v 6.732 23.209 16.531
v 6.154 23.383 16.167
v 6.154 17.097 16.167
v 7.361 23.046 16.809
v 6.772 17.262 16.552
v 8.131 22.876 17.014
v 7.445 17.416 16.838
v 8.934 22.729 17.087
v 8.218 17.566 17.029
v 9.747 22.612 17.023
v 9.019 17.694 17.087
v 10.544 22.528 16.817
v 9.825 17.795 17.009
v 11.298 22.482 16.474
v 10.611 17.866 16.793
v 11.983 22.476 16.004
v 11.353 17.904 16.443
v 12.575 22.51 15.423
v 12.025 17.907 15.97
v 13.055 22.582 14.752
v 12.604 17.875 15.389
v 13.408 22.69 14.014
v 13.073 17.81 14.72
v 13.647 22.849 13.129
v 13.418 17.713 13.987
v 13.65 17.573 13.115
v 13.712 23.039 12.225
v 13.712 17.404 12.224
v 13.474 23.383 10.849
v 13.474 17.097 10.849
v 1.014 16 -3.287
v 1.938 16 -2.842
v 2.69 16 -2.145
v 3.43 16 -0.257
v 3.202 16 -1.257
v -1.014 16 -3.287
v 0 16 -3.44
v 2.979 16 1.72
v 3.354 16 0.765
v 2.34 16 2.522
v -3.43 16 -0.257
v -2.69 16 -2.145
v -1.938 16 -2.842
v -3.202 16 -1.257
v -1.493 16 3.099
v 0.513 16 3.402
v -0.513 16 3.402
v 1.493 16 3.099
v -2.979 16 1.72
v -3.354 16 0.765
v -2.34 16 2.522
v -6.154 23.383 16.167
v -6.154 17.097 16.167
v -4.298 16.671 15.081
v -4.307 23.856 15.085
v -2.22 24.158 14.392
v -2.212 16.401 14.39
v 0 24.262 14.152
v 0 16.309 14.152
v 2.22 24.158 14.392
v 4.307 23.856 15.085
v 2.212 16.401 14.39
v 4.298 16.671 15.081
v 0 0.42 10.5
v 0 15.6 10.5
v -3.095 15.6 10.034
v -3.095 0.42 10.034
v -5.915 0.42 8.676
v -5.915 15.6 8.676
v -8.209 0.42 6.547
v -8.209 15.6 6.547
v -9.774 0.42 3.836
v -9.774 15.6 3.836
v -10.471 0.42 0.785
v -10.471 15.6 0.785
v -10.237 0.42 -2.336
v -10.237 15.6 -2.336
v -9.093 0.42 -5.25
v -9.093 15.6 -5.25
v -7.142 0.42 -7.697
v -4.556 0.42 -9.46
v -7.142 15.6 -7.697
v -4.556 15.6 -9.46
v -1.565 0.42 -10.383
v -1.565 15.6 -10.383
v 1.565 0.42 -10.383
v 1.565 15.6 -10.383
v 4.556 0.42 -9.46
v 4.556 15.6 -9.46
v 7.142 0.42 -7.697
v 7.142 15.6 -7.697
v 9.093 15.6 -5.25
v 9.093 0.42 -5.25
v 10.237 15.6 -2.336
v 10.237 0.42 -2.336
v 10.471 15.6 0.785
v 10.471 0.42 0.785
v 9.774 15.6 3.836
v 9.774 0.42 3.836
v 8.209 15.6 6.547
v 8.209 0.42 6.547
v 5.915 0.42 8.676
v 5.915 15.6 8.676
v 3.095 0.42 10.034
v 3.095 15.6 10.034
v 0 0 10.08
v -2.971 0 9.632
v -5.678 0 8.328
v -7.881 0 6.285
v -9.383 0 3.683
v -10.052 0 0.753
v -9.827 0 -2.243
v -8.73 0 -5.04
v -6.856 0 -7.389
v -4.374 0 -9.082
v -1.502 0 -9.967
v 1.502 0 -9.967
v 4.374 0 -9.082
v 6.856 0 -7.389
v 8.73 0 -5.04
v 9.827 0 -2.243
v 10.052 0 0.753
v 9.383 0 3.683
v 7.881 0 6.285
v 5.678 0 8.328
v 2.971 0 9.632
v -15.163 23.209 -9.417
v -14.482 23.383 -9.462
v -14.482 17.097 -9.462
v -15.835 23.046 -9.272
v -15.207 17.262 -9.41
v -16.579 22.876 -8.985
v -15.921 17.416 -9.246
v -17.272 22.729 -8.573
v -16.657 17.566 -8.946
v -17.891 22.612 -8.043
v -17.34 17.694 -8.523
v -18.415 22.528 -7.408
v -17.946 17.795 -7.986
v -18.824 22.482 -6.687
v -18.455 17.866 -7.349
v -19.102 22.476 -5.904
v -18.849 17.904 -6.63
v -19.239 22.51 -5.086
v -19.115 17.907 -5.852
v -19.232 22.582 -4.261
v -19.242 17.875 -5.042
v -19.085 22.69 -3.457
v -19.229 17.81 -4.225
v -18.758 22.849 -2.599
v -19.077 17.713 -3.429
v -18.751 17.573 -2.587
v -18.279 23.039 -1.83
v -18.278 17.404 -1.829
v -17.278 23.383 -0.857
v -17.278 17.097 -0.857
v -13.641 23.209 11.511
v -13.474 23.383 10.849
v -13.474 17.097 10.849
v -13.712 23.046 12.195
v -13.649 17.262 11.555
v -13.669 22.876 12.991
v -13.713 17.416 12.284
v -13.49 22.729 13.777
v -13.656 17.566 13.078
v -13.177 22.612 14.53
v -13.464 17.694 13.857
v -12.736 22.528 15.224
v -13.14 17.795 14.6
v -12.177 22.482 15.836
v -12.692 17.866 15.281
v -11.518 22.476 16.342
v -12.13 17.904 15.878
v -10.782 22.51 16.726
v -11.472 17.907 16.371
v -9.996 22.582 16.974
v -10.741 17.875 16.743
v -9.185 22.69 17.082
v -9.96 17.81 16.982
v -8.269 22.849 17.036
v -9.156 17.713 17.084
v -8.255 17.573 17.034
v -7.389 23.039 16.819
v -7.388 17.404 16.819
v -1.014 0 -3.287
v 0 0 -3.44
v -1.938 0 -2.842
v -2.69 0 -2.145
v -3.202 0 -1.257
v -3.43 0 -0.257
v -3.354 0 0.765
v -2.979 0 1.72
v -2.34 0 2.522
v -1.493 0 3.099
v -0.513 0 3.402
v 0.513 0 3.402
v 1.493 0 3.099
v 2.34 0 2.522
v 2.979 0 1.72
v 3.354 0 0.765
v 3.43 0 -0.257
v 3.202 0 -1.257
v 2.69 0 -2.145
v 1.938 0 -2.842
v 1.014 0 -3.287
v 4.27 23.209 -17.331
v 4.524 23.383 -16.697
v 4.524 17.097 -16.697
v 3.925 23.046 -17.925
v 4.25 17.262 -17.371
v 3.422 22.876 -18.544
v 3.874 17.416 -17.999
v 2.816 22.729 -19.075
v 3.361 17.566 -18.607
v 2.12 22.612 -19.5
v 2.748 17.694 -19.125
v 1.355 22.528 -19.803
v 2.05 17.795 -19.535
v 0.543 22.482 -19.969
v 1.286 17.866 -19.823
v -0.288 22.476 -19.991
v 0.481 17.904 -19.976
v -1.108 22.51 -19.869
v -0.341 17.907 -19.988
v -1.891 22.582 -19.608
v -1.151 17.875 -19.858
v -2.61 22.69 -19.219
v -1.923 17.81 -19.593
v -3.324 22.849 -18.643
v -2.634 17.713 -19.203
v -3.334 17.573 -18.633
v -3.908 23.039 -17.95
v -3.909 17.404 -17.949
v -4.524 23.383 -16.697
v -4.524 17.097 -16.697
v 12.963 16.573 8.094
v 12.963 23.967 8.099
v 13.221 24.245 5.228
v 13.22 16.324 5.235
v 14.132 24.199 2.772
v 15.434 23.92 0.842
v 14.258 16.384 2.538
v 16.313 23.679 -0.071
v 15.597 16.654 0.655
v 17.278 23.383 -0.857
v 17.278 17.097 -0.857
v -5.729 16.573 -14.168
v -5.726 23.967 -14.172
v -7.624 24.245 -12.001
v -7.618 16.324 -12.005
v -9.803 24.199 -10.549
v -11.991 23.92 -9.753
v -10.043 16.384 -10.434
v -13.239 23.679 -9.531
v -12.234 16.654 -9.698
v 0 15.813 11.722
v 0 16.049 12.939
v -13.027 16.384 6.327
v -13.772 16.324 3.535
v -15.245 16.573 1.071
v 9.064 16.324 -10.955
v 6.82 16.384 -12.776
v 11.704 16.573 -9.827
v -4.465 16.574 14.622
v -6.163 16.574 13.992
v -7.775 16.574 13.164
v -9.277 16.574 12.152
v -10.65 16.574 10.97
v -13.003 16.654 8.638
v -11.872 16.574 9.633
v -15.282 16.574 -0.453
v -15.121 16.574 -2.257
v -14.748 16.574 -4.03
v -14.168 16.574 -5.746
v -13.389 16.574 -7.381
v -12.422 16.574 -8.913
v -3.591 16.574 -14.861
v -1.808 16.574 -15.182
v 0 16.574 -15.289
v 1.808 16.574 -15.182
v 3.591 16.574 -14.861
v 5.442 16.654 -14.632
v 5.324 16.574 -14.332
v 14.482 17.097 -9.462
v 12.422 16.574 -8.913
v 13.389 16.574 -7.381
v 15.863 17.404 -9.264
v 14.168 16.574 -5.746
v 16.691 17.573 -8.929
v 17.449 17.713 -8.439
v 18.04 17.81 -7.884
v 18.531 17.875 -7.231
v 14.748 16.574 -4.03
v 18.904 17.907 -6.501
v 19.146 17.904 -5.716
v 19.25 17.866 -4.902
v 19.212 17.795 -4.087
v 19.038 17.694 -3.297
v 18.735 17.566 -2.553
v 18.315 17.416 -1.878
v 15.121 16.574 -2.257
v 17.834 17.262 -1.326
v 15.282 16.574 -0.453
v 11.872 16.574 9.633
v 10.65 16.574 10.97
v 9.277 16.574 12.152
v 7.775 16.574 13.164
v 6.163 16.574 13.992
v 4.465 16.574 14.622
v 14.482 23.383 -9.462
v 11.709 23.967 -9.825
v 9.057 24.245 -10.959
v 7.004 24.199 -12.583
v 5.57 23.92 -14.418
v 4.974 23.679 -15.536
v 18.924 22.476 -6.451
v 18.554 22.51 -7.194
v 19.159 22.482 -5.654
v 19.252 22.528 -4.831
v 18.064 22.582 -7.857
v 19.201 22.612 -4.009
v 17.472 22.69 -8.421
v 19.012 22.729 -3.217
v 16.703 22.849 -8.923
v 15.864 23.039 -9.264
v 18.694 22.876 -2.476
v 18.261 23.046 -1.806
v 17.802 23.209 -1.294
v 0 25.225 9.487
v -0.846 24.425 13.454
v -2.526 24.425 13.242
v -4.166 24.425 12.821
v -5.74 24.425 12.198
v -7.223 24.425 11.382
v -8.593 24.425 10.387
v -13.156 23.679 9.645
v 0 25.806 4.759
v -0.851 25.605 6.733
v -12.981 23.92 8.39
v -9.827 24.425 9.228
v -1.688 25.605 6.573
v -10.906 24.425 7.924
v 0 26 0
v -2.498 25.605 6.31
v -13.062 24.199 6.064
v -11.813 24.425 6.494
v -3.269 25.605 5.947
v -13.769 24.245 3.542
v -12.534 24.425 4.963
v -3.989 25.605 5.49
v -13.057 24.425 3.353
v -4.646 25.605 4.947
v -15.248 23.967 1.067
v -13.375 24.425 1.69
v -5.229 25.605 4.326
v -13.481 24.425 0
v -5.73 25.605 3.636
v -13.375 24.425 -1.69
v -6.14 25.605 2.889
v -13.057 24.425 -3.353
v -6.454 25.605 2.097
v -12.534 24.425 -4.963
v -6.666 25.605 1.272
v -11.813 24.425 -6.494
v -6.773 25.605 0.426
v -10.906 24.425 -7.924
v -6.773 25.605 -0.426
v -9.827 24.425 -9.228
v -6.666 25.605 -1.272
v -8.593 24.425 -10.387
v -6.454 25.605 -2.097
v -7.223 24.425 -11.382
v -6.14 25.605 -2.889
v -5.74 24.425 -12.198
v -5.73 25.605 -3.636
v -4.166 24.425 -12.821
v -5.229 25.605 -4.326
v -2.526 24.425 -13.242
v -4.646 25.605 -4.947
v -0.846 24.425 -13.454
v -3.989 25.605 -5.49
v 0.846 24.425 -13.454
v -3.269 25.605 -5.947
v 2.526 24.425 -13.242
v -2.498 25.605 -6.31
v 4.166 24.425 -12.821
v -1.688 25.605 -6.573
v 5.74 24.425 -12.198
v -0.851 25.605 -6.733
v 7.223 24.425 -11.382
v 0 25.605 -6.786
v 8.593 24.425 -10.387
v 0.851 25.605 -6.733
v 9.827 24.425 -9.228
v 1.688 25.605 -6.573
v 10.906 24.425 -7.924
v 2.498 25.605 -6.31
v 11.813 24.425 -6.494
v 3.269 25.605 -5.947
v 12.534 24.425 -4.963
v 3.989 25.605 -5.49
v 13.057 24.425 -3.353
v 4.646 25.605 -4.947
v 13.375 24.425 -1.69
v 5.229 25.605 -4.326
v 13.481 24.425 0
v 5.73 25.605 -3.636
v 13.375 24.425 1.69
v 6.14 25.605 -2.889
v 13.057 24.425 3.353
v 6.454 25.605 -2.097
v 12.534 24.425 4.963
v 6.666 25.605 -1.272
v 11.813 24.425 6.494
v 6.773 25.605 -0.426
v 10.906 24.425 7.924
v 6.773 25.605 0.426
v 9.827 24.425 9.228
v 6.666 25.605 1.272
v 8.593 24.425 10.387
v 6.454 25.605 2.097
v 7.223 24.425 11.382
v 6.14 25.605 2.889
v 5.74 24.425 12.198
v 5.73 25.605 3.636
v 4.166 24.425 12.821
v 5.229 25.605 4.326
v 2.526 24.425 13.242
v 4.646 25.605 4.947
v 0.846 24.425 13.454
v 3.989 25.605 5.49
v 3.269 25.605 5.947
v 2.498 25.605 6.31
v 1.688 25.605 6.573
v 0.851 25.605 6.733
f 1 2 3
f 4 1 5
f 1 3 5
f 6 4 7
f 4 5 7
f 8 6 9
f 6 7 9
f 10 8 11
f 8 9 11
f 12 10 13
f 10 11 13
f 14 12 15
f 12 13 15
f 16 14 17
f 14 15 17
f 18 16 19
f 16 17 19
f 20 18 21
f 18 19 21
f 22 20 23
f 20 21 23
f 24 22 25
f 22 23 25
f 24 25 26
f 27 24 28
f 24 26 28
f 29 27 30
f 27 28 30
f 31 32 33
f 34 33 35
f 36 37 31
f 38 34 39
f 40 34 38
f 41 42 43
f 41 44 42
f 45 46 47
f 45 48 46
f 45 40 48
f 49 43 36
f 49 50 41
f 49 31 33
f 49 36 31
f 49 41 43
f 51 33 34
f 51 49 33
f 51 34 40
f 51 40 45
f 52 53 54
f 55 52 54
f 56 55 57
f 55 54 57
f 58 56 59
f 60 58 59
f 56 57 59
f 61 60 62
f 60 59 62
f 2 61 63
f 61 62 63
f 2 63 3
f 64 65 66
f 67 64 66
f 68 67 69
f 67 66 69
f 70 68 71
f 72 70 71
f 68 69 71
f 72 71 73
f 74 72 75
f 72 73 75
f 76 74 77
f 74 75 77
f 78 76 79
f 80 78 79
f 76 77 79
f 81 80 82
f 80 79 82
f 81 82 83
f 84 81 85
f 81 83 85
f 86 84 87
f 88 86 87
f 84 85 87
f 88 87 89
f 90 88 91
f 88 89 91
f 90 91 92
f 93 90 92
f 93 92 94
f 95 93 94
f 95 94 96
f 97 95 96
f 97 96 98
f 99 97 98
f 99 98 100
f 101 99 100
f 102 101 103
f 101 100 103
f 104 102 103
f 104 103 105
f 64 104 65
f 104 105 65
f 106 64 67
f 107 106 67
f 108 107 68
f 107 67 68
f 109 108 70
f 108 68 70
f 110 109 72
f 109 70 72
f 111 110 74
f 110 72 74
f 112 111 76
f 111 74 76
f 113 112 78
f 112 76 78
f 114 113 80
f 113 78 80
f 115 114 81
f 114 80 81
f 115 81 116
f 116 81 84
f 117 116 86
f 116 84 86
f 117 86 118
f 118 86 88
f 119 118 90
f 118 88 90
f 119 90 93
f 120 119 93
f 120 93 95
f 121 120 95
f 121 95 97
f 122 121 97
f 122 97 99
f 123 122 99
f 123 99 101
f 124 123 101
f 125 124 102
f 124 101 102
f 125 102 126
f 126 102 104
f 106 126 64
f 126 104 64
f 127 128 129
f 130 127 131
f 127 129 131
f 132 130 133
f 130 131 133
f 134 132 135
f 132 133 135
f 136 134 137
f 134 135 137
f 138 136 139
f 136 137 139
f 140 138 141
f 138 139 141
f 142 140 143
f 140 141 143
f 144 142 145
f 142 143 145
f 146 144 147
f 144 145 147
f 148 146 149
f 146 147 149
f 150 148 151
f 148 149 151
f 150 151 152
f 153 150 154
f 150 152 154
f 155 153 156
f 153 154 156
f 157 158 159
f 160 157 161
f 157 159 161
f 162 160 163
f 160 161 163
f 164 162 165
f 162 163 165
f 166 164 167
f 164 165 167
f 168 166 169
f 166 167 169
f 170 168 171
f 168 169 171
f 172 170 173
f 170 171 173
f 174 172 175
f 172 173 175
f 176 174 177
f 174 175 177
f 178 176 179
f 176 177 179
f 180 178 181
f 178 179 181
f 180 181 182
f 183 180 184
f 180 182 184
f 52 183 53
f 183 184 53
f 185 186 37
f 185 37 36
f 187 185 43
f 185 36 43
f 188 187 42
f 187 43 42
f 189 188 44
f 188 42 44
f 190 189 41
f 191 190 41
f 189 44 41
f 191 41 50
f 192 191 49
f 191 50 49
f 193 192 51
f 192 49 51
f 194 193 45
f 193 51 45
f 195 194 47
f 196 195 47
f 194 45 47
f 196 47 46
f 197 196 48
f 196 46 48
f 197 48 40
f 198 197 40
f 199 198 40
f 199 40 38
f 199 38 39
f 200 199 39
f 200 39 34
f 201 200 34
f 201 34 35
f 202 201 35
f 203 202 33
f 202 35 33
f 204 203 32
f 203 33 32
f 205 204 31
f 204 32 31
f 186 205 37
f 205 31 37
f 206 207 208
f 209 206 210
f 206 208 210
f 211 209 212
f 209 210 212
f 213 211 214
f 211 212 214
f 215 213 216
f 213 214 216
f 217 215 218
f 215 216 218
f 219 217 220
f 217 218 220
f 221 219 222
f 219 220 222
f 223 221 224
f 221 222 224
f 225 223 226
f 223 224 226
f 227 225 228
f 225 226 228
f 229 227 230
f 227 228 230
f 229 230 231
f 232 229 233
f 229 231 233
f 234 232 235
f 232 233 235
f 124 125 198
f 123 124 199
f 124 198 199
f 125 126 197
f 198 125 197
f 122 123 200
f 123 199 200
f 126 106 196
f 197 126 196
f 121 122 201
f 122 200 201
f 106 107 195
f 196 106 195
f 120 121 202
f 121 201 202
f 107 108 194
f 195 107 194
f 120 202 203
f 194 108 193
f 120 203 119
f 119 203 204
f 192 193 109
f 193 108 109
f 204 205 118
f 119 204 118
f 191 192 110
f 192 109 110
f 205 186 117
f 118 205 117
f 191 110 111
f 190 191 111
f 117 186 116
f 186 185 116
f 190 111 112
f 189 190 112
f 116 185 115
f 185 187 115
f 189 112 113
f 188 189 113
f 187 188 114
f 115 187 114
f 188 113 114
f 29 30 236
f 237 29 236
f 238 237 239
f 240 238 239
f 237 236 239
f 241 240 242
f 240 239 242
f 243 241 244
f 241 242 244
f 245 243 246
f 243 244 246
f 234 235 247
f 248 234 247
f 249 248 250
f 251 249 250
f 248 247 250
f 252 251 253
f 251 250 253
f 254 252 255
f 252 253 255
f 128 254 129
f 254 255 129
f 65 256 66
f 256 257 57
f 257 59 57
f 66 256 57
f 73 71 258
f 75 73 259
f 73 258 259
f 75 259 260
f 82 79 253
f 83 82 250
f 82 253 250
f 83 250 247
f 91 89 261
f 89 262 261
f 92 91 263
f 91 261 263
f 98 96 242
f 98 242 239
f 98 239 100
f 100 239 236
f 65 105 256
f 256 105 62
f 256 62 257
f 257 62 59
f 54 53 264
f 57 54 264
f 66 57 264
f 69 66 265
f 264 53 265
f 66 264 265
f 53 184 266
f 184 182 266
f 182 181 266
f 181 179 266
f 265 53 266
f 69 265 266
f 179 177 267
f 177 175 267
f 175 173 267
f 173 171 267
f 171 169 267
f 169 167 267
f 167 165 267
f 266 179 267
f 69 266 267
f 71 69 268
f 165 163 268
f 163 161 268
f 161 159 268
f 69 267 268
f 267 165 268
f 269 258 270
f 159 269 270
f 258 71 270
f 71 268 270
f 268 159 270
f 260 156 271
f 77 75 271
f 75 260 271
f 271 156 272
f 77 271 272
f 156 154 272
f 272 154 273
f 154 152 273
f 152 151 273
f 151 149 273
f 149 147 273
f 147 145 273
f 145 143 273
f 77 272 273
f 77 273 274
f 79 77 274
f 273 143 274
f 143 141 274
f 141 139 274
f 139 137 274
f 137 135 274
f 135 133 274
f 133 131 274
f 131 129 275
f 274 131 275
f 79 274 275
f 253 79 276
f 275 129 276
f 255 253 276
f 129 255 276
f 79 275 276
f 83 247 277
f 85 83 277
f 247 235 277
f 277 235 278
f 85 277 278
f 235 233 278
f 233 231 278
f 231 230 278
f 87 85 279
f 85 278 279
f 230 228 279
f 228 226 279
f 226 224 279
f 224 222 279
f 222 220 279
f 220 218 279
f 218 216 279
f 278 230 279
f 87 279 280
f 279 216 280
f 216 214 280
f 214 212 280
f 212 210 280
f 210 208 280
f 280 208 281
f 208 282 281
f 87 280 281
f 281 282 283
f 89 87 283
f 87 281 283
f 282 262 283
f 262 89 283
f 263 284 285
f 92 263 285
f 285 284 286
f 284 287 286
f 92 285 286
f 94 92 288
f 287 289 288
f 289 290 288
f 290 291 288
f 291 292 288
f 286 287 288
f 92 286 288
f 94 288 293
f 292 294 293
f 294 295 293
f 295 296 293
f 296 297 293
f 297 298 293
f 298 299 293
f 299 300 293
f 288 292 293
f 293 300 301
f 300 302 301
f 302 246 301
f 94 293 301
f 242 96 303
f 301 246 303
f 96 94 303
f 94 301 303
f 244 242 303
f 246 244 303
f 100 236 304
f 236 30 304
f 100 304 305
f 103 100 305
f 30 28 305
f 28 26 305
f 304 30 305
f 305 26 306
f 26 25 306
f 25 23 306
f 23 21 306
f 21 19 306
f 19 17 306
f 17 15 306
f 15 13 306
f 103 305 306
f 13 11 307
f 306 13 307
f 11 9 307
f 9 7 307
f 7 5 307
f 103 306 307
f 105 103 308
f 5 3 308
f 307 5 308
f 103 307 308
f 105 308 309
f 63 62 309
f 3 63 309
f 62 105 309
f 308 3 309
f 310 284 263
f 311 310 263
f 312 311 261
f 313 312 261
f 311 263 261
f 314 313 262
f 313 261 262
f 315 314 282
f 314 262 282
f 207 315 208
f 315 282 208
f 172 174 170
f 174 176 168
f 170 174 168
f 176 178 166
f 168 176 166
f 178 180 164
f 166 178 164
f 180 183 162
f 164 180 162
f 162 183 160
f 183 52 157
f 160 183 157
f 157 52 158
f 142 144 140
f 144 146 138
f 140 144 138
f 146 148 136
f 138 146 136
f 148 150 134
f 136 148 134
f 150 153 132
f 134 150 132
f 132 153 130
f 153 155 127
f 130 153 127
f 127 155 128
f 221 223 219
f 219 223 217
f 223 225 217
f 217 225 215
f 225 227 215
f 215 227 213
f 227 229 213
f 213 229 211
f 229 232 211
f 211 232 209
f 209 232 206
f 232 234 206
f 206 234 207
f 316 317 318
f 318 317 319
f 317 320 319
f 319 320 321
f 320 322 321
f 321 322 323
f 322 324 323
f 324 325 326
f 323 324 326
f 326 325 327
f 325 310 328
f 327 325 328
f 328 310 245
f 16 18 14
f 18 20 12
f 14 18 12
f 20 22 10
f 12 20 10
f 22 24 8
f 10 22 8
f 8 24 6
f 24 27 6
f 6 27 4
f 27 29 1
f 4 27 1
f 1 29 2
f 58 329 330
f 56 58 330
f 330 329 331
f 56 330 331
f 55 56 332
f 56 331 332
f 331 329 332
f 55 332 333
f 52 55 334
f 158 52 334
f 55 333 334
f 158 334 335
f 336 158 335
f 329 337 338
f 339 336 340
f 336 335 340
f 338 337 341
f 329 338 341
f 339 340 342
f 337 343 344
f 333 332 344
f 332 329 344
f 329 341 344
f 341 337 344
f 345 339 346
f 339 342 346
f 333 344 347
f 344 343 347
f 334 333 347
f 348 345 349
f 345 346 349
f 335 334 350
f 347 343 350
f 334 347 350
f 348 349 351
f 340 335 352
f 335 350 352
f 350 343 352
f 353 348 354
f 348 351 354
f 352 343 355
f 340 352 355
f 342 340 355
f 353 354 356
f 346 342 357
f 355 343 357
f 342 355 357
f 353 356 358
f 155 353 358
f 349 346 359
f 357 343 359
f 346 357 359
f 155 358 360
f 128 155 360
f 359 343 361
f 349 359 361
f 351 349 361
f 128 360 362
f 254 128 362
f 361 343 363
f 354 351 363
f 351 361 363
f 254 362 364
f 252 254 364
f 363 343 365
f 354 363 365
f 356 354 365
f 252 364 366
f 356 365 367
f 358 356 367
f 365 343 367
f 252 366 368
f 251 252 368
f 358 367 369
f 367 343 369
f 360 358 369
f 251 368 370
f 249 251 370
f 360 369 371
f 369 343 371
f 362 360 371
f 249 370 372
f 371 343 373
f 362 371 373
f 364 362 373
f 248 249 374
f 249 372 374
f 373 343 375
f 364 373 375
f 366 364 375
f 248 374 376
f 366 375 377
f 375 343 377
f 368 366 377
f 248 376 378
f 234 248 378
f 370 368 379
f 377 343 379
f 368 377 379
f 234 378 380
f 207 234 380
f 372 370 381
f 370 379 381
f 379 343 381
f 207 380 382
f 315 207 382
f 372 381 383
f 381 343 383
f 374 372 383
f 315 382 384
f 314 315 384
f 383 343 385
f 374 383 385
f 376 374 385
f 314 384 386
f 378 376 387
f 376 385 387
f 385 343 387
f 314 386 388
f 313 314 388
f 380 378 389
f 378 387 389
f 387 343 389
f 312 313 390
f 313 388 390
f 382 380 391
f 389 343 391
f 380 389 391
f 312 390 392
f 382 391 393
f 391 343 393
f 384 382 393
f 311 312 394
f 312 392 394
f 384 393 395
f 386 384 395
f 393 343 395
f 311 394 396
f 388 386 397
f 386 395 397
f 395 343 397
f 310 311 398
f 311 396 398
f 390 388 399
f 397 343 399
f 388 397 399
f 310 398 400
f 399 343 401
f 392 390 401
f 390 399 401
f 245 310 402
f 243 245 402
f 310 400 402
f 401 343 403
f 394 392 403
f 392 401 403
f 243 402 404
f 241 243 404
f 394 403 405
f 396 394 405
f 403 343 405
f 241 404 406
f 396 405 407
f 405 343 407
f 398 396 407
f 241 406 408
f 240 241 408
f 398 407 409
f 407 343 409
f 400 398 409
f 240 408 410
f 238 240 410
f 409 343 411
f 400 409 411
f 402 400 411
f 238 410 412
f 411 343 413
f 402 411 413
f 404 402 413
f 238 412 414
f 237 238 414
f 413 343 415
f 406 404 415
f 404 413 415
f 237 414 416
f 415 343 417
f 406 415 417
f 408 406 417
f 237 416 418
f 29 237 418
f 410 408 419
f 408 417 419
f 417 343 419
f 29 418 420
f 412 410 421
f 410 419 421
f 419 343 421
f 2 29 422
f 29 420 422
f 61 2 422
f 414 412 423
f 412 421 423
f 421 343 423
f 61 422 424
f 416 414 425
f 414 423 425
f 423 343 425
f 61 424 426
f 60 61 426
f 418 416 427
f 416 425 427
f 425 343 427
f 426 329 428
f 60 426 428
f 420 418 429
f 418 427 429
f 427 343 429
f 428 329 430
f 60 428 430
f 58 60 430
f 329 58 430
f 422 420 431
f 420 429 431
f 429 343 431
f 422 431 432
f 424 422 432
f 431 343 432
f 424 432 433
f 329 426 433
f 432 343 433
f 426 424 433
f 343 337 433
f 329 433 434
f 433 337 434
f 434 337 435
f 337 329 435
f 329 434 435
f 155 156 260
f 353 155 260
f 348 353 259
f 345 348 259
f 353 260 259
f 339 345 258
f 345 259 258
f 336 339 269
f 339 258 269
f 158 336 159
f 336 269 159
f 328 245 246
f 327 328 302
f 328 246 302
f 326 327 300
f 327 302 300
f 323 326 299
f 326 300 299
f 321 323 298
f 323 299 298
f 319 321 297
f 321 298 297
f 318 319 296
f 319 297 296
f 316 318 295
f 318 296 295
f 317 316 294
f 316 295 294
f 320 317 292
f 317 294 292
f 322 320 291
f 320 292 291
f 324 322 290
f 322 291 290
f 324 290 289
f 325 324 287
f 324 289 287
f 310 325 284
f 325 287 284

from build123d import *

# Parameters (mm, degrees)
SKETCH_2_R          = 21
CUT_EXTRUDE_1_DEPTH = 39.418745425
SKETCH_3_W          = 3.44
SKETCH_3_H          = 16
CHAMFER_1_SIZE      = 0.42


with BuildPart() as part:
    # 草图1 → 旋转1 (revolve)
    with BuildSketch(Plane.XY, mode=Mode.PRIVATE) as revolve_1_sk:
        with BuildLine():
            Line((0, 0), (-10.5, 0))
            Line((-10.5, 0), (-10.5, 15.6))
            ThreePointArc((-10.5, 15.6), (-15.293686607, 16.575499043), (-20, 17.910281389))
            Line((-20, 17.910281389), (-20, 22.473460386))
            ThreePointArc((-20, 22.473460386), (-10.154266119, 25.111616828), (0, 26))
            Line((0, 26), (0, 0))
        make_face()
    revolve(revolve_1_sk.sketch.rotate(Axis((0, 26, 0), (0, -1, 0)), 270), axis=Axis((0, 26, 0), (0, -1, 0)))

    # 草图2 → 切除-拉伸1 (cut, through all)
    with BuildSketch(Plane(origin=(0, 0, 0), x_dir=(1, 0, 0), z_dir=(0, 1, 0))):
        Circle(SKETCH_2_R)
        with BuildLine():
            ThreePointArc((4.524283339, 16.696844937), (0, 20), (-4.524283339, 16.696844937))
            ThreePointArc((-4.524283339, 16.696844937), (-8.31833689, 11.449208504), (-14.48156274, 9.462457989))
            ThreePointArc((-14.48156274, 9.462457989), (-19.021130326, 6.180339887), (-17.277723618, 0.856759687))
            ThreePointArc((-17.277723618, 0.856759687), (-13.459351819, -4.373208504), (-13.474381322, -10.848724283))
            ThreePointArc((-13.474381322, -10.848724283), (-11.755705046, -16.180339887), (-6.153937105, -16.16733833))
            ThreePointArc((-6.153937105, -16.16733833), (0, -14.152), (6.153937105, -16.16733833))
            ThreePointArc((6.153937105, -16.16733833), (11.755705046, -16.180339887), (13.474381322, -10.848724283))
            ThreePointArc((13.474381322, -10.848724283), (13.459351819, -4.373208504), (17.277723618, 0.856759687))
            ThreePointArc((17.277723618, 0.856759687), (19.021130326, 6.180339887), (14.48156274, 9.462457989))
            ThreePointArc((14.48156274, 9.462457989), (8.31833689, 11.449208504), (4.524283339, 16.696844937))
        make_face(mode=Mode.SUBTRACT)
    extrude(amount=CUT_EXTRUDE_1_DEPTH, mode=Mode.SUBTRACT)

    # 草图3 → 切除-旋转1 (revolve, cut)
    with BuildSketch(Plane.XY, mode=Mode.PRIVATE) as cut_revolve_1_sk:
        with Locations((1.72, 8)):
            Rectangle(SKETCH_3_W, SKETCH_3_H)
    revolve(cut_revolve_1_sk.sketch.rotate(Axis((0, 0, 0), (0, 1, 0)), 90), axis=Axis((0, 0, 0), (0, 1, 0)), mode=Mode.SUBTRACT)

    # 倒角1
    chamfer_1_edges = [part.edges().sort_by_distance(p)[0] for p in [
        (0, 0, -10.5),
    ]]
    chamfer(chamfer_1_edges, length=CHAMFER_1_SIZE)


solid = part.part
